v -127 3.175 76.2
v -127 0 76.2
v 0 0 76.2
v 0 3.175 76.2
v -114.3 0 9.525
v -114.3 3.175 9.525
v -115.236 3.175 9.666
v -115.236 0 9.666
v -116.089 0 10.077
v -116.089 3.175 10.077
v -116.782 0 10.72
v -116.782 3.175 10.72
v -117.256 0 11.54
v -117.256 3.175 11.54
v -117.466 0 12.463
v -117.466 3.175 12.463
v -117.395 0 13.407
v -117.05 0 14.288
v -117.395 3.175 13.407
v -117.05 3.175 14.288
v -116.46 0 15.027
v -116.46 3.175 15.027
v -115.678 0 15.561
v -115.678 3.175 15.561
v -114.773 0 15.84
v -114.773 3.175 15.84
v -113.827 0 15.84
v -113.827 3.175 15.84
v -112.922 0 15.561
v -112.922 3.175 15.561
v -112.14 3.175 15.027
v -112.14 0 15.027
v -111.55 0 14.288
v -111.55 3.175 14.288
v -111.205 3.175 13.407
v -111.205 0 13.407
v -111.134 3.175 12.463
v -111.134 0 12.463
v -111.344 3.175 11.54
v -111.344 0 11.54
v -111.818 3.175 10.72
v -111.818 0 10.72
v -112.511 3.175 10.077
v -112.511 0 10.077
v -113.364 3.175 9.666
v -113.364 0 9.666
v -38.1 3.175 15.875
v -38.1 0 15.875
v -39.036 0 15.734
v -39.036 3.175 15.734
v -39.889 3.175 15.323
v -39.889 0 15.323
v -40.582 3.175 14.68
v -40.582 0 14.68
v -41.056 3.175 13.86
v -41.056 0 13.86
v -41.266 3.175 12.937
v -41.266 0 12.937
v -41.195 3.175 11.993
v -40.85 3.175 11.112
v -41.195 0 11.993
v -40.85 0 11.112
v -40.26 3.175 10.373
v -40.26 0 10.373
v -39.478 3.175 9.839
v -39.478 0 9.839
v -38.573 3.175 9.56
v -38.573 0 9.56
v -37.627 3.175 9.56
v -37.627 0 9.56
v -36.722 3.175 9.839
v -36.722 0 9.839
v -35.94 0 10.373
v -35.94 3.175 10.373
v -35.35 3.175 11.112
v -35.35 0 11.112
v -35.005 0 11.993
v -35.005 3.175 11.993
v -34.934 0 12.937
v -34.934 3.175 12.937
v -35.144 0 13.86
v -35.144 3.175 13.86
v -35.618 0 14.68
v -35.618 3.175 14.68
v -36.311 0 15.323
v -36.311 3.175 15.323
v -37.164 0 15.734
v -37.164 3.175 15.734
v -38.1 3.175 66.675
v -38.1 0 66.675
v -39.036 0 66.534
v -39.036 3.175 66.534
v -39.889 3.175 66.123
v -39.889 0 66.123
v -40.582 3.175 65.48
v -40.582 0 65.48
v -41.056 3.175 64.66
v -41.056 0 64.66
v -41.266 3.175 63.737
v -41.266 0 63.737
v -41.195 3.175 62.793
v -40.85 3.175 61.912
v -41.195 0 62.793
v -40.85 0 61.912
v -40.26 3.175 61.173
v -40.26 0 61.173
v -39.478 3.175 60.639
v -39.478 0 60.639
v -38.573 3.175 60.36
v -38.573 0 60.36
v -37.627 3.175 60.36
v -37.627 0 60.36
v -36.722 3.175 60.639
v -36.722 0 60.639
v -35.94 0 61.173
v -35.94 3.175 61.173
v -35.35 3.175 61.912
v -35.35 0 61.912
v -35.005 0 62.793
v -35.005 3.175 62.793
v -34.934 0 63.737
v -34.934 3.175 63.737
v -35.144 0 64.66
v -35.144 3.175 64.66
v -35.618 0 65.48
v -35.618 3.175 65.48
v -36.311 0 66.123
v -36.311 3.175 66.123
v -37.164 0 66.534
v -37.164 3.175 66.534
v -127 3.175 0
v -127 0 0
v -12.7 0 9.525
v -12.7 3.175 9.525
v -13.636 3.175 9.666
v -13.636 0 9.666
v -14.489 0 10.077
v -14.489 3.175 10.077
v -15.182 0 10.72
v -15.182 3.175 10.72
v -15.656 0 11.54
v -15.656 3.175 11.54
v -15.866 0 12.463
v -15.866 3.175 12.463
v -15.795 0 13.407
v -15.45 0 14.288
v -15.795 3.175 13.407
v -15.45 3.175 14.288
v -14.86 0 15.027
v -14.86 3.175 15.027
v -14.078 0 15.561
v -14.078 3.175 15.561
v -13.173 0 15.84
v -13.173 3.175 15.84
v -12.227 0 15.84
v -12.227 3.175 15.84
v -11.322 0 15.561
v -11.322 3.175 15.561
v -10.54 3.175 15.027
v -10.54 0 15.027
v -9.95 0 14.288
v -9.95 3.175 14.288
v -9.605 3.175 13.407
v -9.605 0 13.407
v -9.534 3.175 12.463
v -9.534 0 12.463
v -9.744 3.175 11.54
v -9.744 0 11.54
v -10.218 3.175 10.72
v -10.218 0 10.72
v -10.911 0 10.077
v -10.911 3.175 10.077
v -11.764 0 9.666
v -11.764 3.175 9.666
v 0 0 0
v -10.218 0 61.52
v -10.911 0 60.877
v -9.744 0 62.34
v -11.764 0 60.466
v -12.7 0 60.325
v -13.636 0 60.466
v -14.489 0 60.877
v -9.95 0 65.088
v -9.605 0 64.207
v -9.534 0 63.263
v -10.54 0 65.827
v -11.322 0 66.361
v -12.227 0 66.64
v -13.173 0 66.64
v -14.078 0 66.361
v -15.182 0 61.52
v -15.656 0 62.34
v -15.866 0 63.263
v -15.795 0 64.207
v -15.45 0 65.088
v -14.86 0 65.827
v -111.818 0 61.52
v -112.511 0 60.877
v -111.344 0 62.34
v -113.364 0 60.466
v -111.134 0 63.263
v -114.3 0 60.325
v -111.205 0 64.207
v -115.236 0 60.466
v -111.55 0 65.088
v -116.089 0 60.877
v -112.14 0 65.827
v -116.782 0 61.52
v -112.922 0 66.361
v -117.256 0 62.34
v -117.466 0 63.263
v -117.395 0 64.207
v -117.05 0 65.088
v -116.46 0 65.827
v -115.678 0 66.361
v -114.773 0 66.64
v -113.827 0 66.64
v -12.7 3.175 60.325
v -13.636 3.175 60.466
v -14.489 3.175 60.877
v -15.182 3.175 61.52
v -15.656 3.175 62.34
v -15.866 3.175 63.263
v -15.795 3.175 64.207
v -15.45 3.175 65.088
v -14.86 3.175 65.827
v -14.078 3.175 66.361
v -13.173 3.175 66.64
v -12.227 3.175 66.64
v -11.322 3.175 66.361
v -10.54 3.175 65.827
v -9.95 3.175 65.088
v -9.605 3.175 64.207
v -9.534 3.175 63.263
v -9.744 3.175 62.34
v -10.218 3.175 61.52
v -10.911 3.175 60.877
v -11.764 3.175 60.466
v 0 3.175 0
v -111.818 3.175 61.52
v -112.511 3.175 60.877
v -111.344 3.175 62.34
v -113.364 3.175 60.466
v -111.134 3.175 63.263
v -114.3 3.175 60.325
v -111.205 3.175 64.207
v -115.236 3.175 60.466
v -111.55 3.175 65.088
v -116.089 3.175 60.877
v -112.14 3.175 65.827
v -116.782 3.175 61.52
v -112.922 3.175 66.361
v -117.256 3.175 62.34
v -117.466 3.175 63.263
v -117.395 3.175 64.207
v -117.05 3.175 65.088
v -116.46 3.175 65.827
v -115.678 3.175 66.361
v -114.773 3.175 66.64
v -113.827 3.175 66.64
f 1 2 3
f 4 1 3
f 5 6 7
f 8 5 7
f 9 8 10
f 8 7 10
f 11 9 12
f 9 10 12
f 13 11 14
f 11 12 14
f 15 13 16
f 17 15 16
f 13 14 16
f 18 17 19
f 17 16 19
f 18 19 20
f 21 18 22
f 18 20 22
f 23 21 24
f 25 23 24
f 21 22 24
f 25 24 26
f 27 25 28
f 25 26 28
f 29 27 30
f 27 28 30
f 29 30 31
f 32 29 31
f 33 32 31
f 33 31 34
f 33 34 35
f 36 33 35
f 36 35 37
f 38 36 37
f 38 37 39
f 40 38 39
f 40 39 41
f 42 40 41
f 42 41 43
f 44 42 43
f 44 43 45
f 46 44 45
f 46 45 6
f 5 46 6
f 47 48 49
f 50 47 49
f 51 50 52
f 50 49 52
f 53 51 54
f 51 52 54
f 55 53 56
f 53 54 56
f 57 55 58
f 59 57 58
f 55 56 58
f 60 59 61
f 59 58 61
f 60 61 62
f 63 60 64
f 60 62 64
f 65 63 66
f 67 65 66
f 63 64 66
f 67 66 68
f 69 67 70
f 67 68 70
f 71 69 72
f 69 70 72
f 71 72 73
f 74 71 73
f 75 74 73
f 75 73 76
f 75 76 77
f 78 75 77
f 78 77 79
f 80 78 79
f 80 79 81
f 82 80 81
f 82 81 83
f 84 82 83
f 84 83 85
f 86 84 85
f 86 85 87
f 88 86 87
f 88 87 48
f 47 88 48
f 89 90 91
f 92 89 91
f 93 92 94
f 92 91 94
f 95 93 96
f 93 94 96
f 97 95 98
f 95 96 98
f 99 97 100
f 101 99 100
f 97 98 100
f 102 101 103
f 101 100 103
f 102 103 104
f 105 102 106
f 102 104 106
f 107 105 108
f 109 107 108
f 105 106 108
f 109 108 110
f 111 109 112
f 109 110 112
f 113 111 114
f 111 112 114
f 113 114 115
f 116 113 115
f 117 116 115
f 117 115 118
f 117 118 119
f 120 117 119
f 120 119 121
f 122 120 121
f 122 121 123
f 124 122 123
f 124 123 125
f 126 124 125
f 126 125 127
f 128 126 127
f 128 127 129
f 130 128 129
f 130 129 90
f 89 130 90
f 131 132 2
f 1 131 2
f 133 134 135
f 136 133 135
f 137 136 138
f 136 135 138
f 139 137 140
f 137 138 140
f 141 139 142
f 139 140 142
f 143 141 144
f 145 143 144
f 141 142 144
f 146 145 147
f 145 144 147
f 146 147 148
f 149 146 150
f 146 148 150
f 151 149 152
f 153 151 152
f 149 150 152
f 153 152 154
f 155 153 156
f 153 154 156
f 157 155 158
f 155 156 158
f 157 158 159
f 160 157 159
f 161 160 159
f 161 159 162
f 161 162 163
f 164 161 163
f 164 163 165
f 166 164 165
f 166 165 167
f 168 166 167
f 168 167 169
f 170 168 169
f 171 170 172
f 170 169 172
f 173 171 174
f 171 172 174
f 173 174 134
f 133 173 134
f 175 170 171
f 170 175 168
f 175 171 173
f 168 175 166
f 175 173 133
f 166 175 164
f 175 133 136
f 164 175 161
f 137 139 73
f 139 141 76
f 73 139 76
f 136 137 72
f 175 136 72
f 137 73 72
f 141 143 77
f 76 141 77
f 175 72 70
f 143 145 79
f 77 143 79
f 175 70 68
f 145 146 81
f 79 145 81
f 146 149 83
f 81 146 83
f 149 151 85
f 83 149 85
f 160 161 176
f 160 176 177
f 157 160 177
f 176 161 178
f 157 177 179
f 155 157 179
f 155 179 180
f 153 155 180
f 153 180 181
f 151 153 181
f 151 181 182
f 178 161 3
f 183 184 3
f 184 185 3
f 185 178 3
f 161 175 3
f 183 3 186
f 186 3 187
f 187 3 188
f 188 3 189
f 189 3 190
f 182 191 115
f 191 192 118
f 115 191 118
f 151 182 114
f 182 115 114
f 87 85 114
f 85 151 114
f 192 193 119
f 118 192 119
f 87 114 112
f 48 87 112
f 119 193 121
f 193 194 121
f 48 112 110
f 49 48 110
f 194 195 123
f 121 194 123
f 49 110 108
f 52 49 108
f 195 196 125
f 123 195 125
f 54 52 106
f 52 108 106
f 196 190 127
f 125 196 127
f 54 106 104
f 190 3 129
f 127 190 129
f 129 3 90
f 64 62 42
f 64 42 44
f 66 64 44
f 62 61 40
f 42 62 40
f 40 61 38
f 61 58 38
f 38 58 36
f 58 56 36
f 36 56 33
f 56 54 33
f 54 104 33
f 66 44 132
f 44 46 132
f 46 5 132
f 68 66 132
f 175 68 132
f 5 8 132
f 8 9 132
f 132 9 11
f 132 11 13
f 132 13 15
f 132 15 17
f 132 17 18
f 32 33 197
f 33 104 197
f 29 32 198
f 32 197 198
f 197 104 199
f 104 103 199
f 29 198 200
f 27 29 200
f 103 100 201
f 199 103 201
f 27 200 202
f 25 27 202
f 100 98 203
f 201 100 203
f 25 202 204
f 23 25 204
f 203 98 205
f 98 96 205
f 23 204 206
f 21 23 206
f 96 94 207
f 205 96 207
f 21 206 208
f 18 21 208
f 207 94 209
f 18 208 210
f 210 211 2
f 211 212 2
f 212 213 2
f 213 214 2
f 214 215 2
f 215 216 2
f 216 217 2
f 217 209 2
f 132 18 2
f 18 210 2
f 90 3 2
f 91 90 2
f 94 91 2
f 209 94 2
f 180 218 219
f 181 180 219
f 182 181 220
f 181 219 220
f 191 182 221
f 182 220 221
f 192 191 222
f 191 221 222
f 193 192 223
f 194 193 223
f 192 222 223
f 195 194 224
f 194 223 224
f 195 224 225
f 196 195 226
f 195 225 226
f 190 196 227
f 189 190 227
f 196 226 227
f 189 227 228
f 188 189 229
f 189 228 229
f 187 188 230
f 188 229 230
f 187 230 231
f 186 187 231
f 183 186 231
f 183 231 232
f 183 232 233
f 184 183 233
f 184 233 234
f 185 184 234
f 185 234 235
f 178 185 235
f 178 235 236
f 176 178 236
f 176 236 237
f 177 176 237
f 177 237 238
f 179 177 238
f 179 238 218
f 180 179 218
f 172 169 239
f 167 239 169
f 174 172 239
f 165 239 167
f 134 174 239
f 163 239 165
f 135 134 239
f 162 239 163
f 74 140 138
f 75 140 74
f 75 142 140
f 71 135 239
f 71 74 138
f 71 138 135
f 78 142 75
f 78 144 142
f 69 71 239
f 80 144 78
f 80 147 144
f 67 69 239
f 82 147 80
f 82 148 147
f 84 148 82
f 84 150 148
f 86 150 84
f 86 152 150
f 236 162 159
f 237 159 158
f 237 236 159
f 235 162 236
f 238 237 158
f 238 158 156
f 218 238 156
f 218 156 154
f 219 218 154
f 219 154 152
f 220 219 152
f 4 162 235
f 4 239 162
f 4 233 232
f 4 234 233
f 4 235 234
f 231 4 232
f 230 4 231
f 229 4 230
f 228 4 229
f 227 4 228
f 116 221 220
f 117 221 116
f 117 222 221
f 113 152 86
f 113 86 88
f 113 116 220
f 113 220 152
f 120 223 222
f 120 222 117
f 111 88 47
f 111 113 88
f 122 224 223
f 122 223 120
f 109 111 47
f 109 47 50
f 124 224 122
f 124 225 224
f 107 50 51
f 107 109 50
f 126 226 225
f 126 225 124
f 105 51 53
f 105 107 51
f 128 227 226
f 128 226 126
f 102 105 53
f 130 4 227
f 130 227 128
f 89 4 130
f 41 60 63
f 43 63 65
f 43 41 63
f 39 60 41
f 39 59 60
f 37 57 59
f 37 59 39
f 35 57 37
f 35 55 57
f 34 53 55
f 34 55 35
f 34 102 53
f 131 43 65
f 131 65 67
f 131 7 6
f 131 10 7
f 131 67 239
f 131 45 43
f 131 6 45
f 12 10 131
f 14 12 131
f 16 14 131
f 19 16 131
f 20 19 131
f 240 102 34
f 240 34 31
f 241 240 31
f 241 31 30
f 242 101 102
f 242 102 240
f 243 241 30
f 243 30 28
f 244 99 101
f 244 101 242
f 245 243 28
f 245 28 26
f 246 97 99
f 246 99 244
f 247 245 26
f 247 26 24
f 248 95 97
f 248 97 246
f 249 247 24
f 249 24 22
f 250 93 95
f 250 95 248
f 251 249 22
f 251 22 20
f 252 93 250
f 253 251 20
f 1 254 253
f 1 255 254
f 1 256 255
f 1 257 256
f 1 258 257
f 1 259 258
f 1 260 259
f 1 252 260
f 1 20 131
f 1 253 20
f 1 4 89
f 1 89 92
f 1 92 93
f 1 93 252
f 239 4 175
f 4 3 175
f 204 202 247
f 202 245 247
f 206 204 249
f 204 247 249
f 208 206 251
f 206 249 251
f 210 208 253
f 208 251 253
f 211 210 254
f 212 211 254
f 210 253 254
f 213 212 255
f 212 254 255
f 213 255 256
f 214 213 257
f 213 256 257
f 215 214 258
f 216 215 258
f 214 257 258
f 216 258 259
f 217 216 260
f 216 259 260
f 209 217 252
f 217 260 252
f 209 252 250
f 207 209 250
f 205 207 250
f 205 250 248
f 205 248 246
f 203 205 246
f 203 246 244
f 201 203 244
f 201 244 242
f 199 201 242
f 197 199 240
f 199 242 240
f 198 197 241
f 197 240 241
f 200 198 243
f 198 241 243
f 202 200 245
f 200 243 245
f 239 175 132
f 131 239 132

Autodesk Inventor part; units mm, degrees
ref_plane "YZ Plane" through (0, 0, 0) normal (1, 0, 0) x (0, 1, 0)
ref_plane "XZ Plane" through (0, 0, 0) normal (0, 1, 0) x (-1, 0, 0)
ref_plane "XY Plane" through (0, 0, 0) normal (0, 0, 1) x (1, 0, 0)
sketch "Sketch1" plane through (0, 0, 0) normal (0, 1, 0) x (-1, 0, 0)
  line L0 (0, 0) -> (127, 0)
  line L1 (127, 0) -> (127, 76.2)
  line L2 (127, 76.2) -> (0, 76.2)
  line L3 (0, 76.2) -> (0, 0)
  dimension "d0" = 127
  dimension "d2" = 76.2
extrude "Extrusion1" add sketch "Sketch1" along normal blind 3.175
sketch "Sketch2" plane through (0, 0, 0) normal (0, -1, 0) x (1, 0, 0)
  line L0 (0, 0) -> (-127, 0) projected
  line L1 (0, 76.2) -> (0, 0) projected
  line L2 (-127, 76.2) -> (0, 76.2) projected
  line L3 (-127, 0) -> (-127, 76.2) projected
  point P0 (-114.3, 63.5)
  point P1 (-12.7, 63.5)
  point P2 (-12.7, 12.7)
  point P3 (-114.3, 12.7)
  dimension "d5" = 12.7
  dimension "d6" = 12.7
  dimension "d7" = 12.7
  dimension "d8" = 12.7
  dimension "d9" = 12.7
  dimension "d10" = 12.7
  dimension "d11" = 12.7
  dimension "d12" = 12.7
hole "Hole1" at (-114.3, 0, 63.5) at (-12.7, 0, 63.5) at (-12.7, 0, 12.7) at (-114.3, 0, 12.7) direction (0, 1, 0) diameter 6.35 end through all
sketch "Sketch3" plane through (0, 3.175, 0) normal (0, 1, 0) x (1, 0, 0)
  line L0 (-127, -76.2) -> (0, -76.2) projected
  line L1 (0, -76.2) -> (0, 0) projected
  line L2 (0, 0) -> (-127, 0) projected
  point P0 (-38.1, -63.5)
  point P1 (-38.1, -12.7)
  dimension "d20" = 12.7
  dimension "d21" = 38.1
  dimension "d29" = 12.7
  dimension "d30" = 38.1
hole "Hole2" at (-38.1, 3.175, 63.5) at (-38.1, 3.175, 12.7) direction (0, -1, 0) diameter 6.35 end through all
properties part number "MountSwitchBar" material "Aluminum 6061"
